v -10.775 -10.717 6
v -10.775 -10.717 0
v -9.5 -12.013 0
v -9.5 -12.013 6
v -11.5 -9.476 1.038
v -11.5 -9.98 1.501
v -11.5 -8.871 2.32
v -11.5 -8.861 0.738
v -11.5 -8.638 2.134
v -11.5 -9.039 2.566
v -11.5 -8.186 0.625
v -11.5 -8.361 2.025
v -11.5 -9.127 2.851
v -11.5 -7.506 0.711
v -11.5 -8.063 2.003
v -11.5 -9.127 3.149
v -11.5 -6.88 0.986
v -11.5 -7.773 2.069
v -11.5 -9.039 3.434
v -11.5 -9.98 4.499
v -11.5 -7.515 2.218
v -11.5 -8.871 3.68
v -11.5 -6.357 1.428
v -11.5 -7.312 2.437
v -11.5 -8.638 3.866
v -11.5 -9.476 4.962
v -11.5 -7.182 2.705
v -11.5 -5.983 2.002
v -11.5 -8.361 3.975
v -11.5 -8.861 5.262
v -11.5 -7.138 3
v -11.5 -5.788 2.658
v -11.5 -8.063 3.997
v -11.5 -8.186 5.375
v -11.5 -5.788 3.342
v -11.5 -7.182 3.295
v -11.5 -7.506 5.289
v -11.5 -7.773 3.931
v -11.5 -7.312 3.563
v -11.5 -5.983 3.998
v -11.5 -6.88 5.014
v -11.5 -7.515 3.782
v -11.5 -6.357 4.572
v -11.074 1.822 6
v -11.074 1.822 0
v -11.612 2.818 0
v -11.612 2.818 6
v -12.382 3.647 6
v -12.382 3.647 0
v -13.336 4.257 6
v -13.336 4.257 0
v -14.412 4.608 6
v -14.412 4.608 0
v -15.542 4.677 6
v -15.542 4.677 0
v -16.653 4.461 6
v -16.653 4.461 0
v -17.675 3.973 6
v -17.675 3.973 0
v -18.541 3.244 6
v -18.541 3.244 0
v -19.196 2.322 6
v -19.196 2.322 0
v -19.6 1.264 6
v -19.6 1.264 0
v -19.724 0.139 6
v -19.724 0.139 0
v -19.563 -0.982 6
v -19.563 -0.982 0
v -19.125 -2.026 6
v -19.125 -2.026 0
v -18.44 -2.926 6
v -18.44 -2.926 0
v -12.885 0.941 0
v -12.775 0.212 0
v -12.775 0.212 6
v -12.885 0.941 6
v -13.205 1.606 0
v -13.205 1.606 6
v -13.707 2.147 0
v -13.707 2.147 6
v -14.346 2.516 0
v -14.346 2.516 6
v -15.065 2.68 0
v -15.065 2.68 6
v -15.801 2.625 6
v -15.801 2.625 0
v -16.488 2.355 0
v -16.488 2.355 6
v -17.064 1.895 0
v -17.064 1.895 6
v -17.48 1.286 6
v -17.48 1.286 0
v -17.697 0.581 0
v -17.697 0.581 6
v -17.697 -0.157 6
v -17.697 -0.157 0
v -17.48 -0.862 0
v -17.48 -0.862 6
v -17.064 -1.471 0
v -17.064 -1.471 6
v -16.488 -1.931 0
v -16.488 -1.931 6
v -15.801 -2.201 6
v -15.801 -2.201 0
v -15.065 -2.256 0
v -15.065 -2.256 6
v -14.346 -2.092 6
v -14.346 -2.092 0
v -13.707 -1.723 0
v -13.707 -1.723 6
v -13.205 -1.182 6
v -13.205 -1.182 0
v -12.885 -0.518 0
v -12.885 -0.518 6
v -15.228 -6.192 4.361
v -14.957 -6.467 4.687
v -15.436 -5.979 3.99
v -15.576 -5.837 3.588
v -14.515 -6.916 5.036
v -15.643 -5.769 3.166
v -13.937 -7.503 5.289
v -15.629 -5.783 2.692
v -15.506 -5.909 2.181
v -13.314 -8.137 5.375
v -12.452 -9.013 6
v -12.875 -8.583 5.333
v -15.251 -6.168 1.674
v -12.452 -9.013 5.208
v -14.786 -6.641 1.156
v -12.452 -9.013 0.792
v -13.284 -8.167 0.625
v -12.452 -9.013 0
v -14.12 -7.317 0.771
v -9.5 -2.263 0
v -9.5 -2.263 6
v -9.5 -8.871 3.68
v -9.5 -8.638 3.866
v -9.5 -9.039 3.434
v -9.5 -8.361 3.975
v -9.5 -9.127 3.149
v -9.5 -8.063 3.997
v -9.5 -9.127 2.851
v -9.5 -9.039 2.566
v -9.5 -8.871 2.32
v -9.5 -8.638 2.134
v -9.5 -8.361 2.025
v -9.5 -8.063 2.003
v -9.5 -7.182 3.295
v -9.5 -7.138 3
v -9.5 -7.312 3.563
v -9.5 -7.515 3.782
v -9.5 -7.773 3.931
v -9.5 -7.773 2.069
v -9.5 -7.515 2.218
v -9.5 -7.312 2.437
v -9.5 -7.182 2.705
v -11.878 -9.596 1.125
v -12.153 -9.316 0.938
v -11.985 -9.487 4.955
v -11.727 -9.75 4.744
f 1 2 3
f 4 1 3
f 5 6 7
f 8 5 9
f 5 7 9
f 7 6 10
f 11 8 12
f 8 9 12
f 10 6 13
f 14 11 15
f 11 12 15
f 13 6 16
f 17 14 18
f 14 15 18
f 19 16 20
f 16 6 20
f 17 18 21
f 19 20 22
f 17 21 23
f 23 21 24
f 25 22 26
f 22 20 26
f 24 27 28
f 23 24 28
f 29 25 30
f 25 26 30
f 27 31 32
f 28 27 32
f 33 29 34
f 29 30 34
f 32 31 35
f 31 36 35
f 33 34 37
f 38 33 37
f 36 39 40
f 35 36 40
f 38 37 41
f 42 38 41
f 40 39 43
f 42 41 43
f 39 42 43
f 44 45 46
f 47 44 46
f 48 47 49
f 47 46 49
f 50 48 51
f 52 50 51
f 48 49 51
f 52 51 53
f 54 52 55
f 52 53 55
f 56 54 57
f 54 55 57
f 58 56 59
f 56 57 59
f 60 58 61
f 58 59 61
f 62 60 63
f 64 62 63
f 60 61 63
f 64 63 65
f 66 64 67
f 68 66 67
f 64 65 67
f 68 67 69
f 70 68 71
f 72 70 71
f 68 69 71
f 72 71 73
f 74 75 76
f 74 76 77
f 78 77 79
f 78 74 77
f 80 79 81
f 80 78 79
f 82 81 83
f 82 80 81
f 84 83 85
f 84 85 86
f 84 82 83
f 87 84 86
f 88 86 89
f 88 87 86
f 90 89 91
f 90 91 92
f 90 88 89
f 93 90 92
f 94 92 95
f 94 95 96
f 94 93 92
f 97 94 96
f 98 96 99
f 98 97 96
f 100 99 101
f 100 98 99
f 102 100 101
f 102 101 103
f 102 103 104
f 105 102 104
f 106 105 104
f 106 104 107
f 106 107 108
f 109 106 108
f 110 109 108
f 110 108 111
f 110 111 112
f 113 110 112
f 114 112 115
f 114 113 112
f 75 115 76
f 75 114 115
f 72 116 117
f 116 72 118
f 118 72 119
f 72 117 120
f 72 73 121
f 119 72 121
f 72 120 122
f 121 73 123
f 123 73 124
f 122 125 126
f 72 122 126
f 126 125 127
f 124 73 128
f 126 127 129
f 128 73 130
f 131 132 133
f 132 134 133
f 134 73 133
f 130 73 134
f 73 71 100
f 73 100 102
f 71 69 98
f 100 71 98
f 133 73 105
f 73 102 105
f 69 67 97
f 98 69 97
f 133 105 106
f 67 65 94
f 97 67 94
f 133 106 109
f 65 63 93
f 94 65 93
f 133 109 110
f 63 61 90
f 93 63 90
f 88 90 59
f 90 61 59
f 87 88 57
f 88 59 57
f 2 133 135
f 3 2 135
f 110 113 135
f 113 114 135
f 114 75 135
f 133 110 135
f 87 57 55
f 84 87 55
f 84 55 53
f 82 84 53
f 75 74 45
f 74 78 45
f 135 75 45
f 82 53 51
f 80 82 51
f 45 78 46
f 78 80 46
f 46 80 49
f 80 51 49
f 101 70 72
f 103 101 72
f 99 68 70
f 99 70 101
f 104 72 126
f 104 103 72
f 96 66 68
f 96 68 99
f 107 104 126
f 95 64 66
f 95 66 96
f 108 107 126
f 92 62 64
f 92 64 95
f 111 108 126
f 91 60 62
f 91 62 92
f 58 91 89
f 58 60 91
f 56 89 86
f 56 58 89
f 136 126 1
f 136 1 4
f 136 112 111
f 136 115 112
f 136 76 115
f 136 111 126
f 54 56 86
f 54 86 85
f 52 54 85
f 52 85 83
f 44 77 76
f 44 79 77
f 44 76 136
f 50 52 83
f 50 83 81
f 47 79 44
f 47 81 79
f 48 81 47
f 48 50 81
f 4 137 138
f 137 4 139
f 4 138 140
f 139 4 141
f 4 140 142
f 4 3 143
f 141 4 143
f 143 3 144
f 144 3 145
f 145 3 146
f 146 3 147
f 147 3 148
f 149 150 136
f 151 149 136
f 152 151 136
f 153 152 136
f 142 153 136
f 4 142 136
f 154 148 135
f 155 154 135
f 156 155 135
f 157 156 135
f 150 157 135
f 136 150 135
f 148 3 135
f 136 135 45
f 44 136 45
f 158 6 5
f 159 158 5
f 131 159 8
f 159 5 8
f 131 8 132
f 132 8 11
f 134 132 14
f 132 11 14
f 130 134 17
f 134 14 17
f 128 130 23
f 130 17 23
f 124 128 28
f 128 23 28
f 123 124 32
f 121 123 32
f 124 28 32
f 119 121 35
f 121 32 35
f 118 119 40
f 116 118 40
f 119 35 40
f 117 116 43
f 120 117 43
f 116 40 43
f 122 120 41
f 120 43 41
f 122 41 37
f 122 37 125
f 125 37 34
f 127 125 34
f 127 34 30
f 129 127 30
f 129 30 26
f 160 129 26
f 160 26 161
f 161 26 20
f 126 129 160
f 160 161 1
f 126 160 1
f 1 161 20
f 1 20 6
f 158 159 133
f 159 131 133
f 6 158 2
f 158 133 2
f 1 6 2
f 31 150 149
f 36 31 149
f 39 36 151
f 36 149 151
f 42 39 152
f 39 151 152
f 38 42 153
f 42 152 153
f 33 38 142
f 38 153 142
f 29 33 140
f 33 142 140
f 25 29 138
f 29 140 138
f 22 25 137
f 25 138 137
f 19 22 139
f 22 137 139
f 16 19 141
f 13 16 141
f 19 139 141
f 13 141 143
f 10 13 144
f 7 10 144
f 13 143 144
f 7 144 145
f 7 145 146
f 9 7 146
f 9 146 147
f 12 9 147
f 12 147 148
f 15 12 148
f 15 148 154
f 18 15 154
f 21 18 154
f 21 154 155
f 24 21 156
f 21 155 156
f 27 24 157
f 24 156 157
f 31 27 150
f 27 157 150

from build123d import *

# Parameters (mm, degrees)
F0_R     = 2.475
F0_W     = 1.275
F0_H     = 4.75
F1_DEPTH = 6
F2_R     = 1
F3_DEPTH = 6.1501615181
F4_R     = 2.375
F4_R_2   = 1
F5_DEPTH = 2
F6_DEPTH = 2
F7_DEPTH = 25


with BuildPart() as f1:
    # F0 (on Top) → F1 (new body)
    with BuildSketch(Plane.XY):
        Polygon((-10.775, -9.0130328), (-12.4515975287, -9.0130328), (-10.775, -10.7171244104), align=None)
        with BuildLine():
            ThreePointArc((-18.4399316357, -2.9264975775), (-13.5543171095, -3.9293230017), (-10.775, 0.2119672))
            ThreePointArc((-10.775, 0.2119672), (-10.850506469, 1.0305523641), (-11.0744778417, 1.8215136285))
            ThreePointArc((-11.0744778417, 1.8215136285), (-17.6746133243, 3.9732004057), (-18.4399316357, -2.9264975775))
        make_face()
        with Locations((-15.25, 0.2119672)):
            Circle(F0_R, mode=Mode.SUBTRACT)
        with BuildLine():
            ThreePointArc((-11.0744778417, 1.8215136285), (-10.850506469, 1.0305523641), (-10.775, 0.2119672))
            Line((-10.775, 0.2119672), (-10.775, -4.2630328))
            Line((-10.775, -4.2630328), (-9.5, -4.2630328))
            Line((-9.5, -4.2630328), (-9.5, -2.2630328))
            Line((-9.5, -2.2630328), (-11.0744778417, 1.8215136285))
        make_face()
        with Locations((-10.1375, -6.6380328)):
            Rectangle(F0_W, F0_H)
        Polygon((-9.5, -9.0130328), (-10.775, -9.0130328), (-10.775, -10.7171244104), (-9.5, -12.0130328), align=None)
        with BuildLine():
            Line((-10.775, -4.2630328), (-10.775, 0.2119672))
            ThreePointArc((-10.775, 0.2119672), (-13.5543171095, -3.9293230017), (-18.4399316357, -2.9264975775))
            Line((-18.4399316357, -2.9264975775), (-12.4515975287, -9.0130328))
            Line((-12.4515975287, -9.0130328), (-10.775, -9.0130328))
            Line((-10.775, -9.0130328), (-10.775, -4.2630328))
        make_face()
    extrude(amount=F1_DEPTH)

    # F2 (on face) → F3 (cut, through all)
    with BuildSketch(Plane.YZ.offset(-9.5)):
        with BuildLine():
            ThreePointArc((-5.7630328, 3), (-8.1380328, 5.375), (-10.5130328, 3))
            ThreePointArc((-10.5130328, 3), (-8.1380328, 0.625), (-5.7630328, 3))
        make_face()
        with Locations((-8.1380328, 3)):
            Circle(F2_R, mode=Mode.SUBTRACT)
        with Locations((-8.1380328, 3)):
            Circle(F2_R)
    extrude(amount=-F3_DEPTH, mode=Mode.SUBTRACT)

    # F4 (on face) → F5 (join)
    with BuildSketch(Plane.YZ.offset(-9.5)):
        with Locations((-8.1380328, 3)):
            Circle(F4_R)
        with Locations((-8.1380328, 3)):
            Circle(F4_R_2, mode=Mode.SUBTRACT)
        with Locations((-8.1380328, 3)):
            Circle(F4_R_2)
    extrude(amount=-F5_DEPTH)

    # F4 (on face) → F6 (cut, through all)
    with BuildSketch(Plane.YZ.offset(-9.5)):
        with Locations((-8.1380328, 3)):
            Circle(F4_R_2)
    extrude(amount=-F6_DEPTH, mode=Mode.SUBTRACT)

    # F0 (on Top) → F7 (cut)
    with BuildSketch(Plane.XY):
        Polygon((-12.4515975287, -9.0130328), (-18.4399316357, -2.9264975775), (-21.0827792011, -5.5267050251), (-12.1428475655, -14.6132402476), (-9.5, -12.0130328), (-10.775, -10.7171244104), align=None)
    extrude(amount=F7_DEPTH, mode=Mode.SUBTRACT)


solid = f1.part
